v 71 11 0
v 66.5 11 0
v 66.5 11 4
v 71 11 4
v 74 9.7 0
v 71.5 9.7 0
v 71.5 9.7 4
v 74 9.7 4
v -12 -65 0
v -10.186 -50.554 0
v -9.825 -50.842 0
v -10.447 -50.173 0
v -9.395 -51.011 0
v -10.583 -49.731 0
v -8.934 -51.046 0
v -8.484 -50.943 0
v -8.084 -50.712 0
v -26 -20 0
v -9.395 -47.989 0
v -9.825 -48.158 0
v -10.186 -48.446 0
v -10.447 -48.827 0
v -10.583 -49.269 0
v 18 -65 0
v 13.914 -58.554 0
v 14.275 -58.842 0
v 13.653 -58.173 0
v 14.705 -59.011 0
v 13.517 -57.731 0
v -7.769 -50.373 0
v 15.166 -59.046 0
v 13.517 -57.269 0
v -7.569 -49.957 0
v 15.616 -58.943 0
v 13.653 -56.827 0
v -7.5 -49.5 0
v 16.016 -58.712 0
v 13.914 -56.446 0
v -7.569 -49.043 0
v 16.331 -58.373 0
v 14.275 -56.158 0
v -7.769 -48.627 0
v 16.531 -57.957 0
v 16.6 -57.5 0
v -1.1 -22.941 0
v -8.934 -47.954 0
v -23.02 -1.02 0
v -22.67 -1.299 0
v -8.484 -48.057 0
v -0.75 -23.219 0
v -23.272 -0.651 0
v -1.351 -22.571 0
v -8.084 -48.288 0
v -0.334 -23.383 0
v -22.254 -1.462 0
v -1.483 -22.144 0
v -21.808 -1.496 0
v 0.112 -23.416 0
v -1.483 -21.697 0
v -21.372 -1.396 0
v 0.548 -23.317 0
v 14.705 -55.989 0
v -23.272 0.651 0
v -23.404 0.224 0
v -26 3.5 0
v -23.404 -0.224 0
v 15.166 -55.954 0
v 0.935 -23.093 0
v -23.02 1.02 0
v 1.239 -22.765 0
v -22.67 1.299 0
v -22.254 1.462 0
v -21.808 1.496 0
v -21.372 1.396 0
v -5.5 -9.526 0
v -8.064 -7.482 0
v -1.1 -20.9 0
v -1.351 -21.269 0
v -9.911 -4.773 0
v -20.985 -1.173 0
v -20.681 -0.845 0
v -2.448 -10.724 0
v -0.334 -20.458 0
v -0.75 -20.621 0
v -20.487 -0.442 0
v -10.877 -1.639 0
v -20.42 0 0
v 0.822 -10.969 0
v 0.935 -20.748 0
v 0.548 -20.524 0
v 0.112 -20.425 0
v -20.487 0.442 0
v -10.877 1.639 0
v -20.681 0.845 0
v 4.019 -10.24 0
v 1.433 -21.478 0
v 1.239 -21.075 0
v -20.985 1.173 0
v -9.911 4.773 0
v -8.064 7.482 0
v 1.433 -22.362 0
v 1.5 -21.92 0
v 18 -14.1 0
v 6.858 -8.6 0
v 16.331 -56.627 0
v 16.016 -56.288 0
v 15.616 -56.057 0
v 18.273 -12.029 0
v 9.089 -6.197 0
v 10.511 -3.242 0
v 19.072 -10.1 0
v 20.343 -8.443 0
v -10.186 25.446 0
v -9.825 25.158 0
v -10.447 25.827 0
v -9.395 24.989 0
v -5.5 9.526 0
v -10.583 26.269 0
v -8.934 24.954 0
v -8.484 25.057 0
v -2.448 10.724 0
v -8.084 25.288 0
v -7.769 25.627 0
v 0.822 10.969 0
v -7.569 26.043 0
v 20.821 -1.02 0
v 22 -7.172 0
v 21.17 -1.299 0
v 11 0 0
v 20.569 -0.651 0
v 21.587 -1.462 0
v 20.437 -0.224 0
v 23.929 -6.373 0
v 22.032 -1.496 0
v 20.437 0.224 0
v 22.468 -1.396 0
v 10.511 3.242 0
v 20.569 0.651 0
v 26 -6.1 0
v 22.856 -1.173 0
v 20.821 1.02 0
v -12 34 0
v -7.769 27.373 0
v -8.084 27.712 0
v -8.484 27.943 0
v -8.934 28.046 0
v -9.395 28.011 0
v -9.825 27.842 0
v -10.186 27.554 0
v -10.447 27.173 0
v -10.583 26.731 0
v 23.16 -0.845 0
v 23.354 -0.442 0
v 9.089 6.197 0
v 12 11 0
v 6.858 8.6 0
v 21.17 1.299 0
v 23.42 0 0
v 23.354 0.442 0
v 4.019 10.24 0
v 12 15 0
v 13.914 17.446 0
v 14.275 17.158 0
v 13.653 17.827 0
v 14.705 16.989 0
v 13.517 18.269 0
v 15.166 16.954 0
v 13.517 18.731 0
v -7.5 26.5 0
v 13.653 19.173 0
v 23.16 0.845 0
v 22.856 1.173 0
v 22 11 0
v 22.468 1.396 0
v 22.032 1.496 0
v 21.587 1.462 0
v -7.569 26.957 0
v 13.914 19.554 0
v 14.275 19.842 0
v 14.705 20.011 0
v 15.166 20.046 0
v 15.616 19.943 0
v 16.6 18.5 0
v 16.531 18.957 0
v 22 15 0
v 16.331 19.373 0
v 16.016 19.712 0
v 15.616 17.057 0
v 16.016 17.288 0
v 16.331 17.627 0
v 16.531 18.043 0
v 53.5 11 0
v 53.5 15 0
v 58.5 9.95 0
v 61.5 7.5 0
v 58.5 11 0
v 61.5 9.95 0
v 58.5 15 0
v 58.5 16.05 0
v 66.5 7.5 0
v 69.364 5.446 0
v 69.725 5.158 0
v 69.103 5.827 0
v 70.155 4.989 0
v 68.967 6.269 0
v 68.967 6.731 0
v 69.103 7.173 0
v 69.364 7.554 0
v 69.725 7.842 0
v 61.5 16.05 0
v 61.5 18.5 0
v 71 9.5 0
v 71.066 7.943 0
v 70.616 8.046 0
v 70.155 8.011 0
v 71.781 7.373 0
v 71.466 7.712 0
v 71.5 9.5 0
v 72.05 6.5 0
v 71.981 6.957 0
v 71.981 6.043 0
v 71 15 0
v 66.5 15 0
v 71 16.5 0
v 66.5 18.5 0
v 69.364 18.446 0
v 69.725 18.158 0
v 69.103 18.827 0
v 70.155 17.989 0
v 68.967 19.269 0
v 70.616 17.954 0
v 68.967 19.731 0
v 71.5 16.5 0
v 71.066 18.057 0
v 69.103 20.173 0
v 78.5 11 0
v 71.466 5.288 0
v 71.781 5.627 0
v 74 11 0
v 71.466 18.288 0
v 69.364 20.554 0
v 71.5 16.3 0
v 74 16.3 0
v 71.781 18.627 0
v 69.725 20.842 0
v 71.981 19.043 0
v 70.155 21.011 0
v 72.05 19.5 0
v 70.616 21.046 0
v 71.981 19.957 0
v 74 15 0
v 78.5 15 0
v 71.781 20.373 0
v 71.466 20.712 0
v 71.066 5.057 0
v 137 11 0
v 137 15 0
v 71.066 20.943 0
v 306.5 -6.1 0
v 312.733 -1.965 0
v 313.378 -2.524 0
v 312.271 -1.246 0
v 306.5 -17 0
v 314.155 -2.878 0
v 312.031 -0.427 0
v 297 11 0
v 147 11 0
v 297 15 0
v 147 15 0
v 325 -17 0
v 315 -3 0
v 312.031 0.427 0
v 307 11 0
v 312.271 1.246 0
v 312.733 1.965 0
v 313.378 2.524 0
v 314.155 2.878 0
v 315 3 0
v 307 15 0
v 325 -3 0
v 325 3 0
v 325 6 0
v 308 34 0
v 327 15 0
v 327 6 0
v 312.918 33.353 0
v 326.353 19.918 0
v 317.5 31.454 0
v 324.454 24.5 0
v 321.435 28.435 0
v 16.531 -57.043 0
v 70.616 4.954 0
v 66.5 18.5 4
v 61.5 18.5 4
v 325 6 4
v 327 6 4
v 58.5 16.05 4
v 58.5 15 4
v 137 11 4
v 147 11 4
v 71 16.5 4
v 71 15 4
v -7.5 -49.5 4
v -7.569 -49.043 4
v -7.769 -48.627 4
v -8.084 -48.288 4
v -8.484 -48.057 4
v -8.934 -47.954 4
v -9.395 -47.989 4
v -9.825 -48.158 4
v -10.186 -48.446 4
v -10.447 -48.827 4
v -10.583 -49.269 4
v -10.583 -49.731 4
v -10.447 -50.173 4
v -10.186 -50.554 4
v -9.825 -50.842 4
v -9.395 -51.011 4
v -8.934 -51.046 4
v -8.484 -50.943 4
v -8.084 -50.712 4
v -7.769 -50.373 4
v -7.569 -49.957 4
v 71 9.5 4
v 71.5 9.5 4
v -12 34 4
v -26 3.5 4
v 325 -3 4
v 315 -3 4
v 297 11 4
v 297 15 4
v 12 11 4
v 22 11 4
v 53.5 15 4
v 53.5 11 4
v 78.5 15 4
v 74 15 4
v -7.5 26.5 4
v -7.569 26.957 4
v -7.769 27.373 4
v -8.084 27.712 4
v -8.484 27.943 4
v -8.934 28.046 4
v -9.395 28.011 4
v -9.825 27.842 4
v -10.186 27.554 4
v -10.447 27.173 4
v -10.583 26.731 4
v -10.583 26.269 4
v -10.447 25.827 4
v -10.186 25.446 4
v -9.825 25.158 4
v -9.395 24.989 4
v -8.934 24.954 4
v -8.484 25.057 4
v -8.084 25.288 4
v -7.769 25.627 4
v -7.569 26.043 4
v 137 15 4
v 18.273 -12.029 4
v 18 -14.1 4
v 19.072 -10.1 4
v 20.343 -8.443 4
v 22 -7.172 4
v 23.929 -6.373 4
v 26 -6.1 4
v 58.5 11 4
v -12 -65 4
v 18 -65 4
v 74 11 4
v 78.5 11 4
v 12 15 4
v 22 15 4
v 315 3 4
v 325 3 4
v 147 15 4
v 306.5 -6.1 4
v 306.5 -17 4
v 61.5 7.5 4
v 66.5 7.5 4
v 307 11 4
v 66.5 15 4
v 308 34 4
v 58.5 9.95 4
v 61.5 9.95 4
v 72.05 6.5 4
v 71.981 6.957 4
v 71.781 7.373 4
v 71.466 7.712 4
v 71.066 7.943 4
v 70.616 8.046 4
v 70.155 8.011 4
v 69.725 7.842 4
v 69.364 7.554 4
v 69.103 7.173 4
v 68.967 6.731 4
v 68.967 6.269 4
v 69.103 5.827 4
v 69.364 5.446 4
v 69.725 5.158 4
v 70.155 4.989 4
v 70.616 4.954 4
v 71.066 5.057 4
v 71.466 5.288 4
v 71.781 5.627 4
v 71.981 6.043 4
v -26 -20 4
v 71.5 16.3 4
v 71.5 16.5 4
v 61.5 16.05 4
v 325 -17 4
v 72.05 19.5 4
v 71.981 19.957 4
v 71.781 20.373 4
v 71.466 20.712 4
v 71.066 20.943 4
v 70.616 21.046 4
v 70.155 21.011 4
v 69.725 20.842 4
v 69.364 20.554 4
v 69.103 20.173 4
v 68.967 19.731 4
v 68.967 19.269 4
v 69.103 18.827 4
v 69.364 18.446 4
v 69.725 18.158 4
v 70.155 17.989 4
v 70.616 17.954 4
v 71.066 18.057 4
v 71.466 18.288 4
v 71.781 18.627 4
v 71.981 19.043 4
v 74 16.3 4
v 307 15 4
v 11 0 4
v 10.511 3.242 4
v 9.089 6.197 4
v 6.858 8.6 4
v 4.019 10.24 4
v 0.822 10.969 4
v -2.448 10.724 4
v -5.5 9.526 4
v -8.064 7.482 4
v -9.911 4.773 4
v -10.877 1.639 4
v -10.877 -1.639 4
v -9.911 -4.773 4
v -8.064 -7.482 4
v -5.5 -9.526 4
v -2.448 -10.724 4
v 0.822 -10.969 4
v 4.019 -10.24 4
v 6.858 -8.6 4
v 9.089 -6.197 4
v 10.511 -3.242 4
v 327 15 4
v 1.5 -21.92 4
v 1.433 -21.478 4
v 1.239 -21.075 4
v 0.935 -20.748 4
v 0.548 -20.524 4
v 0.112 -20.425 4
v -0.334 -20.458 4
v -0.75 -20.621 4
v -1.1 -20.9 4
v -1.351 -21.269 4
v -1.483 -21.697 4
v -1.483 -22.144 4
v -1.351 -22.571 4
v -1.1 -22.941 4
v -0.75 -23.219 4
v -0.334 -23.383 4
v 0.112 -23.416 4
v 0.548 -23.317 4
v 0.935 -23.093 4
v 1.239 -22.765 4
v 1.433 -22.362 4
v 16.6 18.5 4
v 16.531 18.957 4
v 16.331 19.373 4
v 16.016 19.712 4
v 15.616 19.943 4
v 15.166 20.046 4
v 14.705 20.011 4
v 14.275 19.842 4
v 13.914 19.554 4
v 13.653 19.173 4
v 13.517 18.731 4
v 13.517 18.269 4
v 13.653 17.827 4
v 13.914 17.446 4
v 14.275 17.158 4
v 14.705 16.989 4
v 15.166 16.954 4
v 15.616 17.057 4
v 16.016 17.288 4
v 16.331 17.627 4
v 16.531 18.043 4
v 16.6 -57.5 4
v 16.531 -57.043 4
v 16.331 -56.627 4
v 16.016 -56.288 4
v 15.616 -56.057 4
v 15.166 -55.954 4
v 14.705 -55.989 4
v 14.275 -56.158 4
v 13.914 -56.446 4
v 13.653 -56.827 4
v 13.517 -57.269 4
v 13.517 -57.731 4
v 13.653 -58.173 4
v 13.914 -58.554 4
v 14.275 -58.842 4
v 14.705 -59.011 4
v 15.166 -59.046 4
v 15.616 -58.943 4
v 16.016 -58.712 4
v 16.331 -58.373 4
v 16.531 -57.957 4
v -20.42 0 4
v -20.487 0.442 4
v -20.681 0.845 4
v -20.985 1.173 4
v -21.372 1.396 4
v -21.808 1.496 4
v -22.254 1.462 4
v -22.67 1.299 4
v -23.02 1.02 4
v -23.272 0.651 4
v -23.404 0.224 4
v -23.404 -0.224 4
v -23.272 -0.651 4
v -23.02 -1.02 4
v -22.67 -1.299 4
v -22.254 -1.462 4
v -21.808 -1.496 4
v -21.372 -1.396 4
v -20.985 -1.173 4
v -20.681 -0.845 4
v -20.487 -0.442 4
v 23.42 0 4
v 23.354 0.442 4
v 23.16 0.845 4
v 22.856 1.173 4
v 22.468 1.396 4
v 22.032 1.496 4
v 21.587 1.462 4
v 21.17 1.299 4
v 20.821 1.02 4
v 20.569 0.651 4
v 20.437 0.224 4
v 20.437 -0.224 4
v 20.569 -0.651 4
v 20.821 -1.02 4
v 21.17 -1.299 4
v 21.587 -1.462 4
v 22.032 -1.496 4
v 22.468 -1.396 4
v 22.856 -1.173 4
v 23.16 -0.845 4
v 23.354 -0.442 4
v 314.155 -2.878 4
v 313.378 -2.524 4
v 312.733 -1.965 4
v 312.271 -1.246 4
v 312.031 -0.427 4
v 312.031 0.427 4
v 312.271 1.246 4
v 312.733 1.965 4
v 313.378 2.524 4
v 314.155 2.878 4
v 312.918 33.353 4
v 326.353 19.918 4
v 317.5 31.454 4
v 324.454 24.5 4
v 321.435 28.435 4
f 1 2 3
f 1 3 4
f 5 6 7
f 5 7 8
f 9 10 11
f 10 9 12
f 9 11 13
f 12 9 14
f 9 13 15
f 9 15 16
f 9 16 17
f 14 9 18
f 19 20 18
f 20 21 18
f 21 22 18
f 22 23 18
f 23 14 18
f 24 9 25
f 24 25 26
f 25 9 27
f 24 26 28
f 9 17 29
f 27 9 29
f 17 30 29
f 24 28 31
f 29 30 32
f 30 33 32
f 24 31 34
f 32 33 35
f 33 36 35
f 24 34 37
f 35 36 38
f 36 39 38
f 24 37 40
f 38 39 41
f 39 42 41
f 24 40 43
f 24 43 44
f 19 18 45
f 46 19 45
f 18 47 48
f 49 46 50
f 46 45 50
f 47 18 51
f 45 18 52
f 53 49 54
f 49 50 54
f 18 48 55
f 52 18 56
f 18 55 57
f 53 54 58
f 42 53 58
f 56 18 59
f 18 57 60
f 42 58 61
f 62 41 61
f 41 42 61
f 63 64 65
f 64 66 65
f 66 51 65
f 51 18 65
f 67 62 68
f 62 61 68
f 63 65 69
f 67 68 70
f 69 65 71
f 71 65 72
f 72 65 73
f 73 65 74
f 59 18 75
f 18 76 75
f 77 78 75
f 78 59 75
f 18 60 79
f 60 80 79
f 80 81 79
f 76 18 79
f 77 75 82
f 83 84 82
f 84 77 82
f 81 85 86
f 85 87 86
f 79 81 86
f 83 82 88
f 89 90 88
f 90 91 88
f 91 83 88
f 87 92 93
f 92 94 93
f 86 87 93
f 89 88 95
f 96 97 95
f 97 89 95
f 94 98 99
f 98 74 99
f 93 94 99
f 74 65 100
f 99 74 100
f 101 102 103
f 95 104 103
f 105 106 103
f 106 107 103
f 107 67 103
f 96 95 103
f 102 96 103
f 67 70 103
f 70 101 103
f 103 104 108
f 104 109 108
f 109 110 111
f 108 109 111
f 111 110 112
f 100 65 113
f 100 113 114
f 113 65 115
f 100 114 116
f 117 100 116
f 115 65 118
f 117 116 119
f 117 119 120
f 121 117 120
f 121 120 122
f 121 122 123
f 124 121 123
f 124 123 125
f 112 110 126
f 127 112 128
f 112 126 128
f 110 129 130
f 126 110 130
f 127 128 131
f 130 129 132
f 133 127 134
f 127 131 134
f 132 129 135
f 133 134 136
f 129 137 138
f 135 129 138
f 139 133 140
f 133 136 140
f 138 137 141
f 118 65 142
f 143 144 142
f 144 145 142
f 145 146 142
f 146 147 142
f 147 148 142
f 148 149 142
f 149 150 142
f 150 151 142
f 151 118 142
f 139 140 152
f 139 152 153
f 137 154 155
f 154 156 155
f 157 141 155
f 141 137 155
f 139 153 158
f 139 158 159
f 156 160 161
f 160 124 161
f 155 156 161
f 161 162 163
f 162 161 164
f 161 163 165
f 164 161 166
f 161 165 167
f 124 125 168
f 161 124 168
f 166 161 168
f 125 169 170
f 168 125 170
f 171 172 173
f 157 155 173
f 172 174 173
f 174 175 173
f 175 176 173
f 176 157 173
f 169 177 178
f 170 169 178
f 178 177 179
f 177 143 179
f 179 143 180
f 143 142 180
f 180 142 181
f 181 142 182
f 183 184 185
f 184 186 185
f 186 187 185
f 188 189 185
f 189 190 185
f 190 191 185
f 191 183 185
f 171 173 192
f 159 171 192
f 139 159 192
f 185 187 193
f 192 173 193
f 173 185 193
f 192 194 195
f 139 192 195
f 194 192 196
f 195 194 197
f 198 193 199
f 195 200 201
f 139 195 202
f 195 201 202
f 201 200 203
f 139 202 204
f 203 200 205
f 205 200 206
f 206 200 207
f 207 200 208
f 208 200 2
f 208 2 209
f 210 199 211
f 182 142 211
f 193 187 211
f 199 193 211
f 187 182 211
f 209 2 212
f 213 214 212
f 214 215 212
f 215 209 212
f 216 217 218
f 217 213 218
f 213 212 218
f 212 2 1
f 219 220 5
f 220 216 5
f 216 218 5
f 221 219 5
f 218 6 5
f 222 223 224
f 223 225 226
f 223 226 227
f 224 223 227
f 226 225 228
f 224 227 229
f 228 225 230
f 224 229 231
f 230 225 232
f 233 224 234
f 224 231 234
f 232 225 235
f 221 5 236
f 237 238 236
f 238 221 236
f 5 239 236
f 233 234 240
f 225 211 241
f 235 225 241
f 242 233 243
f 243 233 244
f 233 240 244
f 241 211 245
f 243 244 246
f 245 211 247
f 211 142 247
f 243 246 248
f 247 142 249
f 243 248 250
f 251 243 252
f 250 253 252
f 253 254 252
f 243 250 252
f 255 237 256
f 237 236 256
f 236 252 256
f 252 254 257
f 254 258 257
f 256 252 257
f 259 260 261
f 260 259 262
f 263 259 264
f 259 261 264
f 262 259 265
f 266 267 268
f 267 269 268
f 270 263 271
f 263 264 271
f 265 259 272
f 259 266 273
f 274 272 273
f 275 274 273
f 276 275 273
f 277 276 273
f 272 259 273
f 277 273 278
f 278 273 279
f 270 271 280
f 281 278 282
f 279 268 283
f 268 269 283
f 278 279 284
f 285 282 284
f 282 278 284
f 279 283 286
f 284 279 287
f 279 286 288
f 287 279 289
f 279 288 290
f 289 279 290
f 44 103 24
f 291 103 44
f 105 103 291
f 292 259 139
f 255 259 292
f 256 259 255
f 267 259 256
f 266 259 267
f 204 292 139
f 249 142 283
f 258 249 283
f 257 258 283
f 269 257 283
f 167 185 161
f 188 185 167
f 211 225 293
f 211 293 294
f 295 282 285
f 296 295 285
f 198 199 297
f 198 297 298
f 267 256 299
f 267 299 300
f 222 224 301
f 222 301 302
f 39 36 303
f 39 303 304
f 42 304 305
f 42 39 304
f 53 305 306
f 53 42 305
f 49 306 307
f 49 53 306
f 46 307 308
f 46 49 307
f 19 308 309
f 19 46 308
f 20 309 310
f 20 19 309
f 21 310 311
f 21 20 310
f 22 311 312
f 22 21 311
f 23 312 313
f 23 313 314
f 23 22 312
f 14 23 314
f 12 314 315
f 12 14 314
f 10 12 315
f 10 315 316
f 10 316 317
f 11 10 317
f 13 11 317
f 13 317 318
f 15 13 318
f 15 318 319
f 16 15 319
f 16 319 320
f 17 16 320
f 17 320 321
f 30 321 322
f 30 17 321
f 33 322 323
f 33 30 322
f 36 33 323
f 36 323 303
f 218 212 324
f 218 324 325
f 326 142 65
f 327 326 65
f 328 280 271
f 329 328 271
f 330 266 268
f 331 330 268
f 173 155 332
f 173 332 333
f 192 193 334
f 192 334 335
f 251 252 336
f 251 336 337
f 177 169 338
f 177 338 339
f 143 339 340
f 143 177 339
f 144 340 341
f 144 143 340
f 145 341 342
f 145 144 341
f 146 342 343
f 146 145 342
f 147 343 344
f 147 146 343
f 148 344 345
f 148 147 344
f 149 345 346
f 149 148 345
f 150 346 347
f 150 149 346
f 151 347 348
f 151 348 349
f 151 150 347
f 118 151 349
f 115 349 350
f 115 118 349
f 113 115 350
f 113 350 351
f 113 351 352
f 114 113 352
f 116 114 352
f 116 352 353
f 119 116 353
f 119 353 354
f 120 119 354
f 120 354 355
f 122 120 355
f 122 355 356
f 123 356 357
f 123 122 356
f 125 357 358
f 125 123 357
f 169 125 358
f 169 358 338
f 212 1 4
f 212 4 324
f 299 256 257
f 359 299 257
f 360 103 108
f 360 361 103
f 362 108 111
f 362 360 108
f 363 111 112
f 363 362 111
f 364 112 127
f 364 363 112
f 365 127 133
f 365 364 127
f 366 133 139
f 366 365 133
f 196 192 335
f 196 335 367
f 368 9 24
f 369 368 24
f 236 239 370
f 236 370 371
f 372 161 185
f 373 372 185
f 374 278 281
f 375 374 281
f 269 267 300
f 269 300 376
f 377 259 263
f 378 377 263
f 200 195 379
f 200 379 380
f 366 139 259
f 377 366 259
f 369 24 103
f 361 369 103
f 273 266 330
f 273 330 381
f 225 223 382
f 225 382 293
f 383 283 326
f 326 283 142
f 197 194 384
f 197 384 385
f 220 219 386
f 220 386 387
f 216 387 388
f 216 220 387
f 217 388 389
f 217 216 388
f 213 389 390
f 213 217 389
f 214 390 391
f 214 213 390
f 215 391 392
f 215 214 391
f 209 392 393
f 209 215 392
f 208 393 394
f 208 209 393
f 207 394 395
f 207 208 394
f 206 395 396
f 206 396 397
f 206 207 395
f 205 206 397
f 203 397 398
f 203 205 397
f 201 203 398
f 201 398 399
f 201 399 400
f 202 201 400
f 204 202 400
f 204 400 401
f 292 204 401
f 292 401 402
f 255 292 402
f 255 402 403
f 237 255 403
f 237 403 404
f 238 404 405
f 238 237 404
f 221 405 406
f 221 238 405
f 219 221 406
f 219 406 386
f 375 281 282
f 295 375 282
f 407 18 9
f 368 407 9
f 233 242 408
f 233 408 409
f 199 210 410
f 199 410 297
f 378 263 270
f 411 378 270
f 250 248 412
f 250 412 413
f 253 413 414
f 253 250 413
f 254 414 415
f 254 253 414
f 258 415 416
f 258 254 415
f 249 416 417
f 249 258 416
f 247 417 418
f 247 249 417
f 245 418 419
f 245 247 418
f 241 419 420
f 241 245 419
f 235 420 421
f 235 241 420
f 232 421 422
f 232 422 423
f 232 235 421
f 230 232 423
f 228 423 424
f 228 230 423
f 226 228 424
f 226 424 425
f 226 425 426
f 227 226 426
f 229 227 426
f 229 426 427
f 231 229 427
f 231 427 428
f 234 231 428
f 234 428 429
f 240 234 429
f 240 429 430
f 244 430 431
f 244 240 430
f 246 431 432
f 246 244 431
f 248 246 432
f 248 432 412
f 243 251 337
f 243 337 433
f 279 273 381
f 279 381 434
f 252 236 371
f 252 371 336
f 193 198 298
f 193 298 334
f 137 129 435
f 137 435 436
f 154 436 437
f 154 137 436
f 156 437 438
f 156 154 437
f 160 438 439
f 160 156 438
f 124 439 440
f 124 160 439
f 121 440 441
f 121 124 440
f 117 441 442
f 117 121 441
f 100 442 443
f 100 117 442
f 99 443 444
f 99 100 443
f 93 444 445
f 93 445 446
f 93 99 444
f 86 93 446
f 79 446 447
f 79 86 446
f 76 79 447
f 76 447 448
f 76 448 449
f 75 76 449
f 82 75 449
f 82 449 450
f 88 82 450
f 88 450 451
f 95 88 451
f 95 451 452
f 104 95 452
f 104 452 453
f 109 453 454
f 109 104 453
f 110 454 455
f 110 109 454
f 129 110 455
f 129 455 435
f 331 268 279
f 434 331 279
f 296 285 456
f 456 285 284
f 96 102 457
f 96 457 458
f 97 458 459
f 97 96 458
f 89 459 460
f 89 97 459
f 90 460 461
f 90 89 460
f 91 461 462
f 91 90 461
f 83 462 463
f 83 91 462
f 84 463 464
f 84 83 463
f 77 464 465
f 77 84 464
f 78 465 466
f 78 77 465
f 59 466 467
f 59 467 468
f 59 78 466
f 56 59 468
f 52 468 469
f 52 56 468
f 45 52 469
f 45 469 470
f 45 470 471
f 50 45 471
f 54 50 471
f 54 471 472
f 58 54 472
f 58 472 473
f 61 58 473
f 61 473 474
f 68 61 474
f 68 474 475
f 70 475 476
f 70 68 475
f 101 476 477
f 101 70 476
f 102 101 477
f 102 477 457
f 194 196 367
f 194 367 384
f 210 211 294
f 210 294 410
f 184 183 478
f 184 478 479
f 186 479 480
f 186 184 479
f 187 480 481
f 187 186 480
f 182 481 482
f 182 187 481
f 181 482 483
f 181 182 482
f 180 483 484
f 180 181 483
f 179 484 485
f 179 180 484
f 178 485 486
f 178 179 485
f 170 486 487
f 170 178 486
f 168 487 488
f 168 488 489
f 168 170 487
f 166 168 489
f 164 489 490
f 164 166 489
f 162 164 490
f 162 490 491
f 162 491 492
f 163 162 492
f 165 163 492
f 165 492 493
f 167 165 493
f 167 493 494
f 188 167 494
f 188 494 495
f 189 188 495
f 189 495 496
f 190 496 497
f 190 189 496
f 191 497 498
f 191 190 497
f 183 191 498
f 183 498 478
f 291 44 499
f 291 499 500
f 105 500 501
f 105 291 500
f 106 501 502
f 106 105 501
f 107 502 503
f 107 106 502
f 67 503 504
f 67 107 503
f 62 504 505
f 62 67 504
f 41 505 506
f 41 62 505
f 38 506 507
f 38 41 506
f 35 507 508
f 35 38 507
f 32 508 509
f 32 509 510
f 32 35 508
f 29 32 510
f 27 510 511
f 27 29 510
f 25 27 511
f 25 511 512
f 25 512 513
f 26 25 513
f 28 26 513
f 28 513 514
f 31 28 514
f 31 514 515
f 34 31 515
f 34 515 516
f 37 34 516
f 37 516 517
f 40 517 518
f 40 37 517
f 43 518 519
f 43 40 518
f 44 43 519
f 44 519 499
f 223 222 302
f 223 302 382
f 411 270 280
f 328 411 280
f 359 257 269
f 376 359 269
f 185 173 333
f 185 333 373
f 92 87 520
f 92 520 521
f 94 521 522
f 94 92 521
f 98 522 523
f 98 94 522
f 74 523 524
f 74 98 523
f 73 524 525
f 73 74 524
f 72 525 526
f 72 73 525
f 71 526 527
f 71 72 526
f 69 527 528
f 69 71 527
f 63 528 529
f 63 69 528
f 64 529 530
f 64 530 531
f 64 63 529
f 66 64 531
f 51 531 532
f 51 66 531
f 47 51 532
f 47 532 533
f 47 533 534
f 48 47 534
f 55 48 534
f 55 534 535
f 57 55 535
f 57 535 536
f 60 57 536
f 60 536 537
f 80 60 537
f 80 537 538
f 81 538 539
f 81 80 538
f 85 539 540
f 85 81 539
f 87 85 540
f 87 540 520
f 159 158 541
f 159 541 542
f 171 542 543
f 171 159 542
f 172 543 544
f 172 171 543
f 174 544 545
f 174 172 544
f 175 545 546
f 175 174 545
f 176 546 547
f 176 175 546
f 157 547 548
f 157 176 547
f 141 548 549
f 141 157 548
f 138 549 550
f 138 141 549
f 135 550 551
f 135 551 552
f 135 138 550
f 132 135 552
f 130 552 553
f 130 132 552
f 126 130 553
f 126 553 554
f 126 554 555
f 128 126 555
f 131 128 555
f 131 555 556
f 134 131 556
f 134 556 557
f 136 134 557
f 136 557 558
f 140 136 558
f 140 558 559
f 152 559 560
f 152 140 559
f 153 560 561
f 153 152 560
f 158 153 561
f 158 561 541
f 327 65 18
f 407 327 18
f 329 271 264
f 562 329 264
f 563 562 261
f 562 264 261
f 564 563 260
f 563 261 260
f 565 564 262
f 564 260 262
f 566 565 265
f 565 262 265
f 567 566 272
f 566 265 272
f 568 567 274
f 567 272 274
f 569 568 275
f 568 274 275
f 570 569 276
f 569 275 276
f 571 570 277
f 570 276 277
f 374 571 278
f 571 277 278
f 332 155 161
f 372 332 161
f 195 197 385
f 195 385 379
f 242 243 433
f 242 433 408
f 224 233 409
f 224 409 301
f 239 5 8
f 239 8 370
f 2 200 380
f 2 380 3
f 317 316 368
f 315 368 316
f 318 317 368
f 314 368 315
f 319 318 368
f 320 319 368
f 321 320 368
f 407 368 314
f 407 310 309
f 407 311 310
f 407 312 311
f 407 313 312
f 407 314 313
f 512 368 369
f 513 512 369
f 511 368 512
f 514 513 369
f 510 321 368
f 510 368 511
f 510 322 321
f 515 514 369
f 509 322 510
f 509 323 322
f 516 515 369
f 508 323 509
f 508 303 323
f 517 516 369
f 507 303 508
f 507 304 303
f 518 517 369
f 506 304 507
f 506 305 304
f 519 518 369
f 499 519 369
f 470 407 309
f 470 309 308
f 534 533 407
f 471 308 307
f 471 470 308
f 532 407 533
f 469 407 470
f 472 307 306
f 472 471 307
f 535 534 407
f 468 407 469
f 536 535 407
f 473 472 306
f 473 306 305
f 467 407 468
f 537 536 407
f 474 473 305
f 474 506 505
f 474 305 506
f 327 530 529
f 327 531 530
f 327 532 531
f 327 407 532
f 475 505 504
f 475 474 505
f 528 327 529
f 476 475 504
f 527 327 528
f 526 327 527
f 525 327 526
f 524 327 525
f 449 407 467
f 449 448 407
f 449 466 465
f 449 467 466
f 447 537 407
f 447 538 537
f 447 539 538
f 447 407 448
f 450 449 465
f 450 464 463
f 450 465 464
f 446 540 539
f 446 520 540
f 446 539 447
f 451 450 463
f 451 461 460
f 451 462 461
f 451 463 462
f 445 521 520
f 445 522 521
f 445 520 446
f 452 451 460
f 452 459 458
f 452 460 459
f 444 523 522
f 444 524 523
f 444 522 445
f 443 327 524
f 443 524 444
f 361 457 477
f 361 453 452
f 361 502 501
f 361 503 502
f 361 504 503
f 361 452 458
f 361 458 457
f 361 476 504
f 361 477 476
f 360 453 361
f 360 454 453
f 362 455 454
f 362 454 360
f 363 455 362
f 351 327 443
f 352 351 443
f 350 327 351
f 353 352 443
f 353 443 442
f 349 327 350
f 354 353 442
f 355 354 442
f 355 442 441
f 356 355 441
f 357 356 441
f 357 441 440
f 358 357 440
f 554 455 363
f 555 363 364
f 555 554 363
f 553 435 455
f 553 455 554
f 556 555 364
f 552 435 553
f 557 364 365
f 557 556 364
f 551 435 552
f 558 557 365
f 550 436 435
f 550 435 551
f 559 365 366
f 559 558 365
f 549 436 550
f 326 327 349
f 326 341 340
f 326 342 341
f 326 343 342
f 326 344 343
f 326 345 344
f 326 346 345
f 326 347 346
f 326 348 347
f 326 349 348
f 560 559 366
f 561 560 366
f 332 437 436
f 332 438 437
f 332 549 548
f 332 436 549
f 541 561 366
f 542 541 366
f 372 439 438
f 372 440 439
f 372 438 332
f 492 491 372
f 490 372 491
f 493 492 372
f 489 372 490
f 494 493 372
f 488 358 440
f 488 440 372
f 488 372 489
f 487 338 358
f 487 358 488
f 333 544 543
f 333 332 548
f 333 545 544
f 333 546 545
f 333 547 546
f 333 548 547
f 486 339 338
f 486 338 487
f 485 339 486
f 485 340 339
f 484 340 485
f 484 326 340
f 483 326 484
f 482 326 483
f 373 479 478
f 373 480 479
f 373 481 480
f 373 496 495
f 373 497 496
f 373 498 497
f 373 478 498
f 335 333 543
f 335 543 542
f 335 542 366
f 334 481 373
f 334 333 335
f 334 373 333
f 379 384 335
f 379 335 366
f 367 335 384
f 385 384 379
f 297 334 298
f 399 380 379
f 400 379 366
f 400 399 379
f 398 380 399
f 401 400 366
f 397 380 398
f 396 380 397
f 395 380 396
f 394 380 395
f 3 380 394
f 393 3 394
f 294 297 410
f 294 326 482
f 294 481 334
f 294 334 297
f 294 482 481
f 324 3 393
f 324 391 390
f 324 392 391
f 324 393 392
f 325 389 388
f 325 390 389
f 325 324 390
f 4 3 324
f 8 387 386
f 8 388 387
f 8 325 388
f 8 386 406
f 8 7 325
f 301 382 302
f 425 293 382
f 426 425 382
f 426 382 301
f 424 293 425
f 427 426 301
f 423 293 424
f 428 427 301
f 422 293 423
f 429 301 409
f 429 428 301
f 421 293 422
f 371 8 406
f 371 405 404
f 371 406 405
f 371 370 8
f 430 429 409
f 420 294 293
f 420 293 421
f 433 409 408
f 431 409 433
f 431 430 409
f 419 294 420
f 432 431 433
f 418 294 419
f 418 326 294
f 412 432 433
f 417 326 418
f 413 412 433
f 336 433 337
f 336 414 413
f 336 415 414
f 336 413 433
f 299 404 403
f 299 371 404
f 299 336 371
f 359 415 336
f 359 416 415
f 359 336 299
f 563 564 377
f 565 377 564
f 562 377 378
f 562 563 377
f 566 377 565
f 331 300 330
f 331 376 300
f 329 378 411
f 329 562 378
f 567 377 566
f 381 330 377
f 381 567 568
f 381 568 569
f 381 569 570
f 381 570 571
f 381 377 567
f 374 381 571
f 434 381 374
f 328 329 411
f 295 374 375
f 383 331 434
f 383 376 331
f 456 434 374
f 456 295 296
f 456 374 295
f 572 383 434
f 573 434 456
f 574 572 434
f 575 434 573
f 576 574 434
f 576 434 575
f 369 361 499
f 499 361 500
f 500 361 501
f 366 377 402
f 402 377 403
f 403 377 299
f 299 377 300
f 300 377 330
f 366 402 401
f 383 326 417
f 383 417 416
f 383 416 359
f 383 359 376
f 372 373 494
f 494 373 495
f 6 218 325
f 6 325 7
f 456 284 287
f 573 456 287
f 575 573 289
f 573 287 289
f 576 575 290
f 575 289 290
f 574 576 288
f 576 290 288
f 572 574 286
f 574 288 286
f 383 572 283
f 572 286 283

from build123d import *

# Parameters (mm, degrees)
SKETCH1_R           = 1.5
SKETCH1_R_2         = 11
SKETCH1_R_3         = 1.55
SKETCH1_W           = 10
SKETCH1_H           = 4
BOSS_EXTRUDE1_DEPTH = 4
FILLET1_R           = 8


with BuildPart() as part:
    # Sketch1 → Boss-Extrude1 (new body)
    with BuildSketch(Plane.XY):
        with BuildLine():
            Line((-12, 34), (-26, 3.5))
            Line((-26, 3.5), (-26, -20))
            Line((-26, -20), (-12, -65))
            Line((-12, -65), (18, -65))
            Line((18, -65), (18, -45))
            Line((18, -45), (18, -6.1))
            Line((18, -6.1), (306.5, -6.1))
            Line((306.5, -6.1), (306.5, -17))
            Line((306.5, -17), (325, -17))
            Line((325, -17), (325, -3))
            Line((325, -3), (315, -3))
            ThreePointArc((315, -3), (312, 0), (315, 3))
            Line((315, 3), (325, 3))
            Line((325, 3), (325, 6))
            Line((325, 6), (327, 6))
            Line((327, 6), (327, 15))
            ThreePointArc((327, 15), (321.435028843, 28.435028843), (308, 34))
            Line((308, 34), (-12, 34))
        make_face()
        with Locations((21.920310217, 0)):
            Circle(SKETCH1_R, mode=Mode.SUBTRACT)
        with Locations((0, -21.920310217)):
            Circle(SKETCH1_R, mode=Mode.SUBTRACT)
        with Locations((-21.920310217, 0)):
            Circle(SKETCH1_R, mode=Mode.SUBTRACT)
        Circle(SKETCH1_R_2, mode=Mode.SUBTRACT)
        with Locations((-9.05, 26.5)):
            Circle(SKETCH1_R_3, mode=Mode.SUBTRACT)
        with Locations((15.05, 18.5)):
            Circle(SKETCH1_R_3, mode=Mode.SUBTRACT)
        with Locations((-9.05, -49.5)):
            Circle(SKETCH1_R_3, mode=Mode.SUBTRACT)
        with Locations((15.05, -57.5)):
            Circle(SKETCH1_R_3, mode=Mode.SUBTRACT)
        with Locations((70.5, 6.5)):
            Circle(SKETCH1_R_3, mode=Mode.SUBTRACT)
        with Locations((70.5, 19.5)):
            Circle(SKETCH1_R_3, mode=Mode.SUBTRACT)
        with Locations((17, 13)):
            Rectangle(SKETCH1_W, SKETCH1_H, mode=Mode.SUBTRACT)
        with Locations((142, 13)):
            Rectangle(SKETCH1_W, SKETCH1_H, mode=Mode.SUBTRACT)
        with Locations((302, 13)):
            Rectangle(SKETCH1_W, SKETCH1_H, mode=Mode.SUBTRACT)
        Polygon((53.5, 11), (58.5, 11), (58.5, 9.95), (61.5, 9.95), (61.5, 7.5), (66.5, 7.5), (66.5, 11), (71, 11), (71, 9.5), (71.5, 9.5), (71.5, 9.7), (74, 9.7), (74, 11), (78.5, 11), (78.5, 15), (74, 15), (74, 16.3), (71.5, 16.3), (71.5, 16.5), (71, 16.5), (71, 15), (66.5, 15), (66.5, 18.5), (61.5, 18.5), (61.5, 16.05), (58.5, 16.05), (58.5, 15), (53.5, 15), align=None, mode=Mode.SUBTRACT)
    extrude(amount=BOSS_EXTRUDE1_DEPTH)

    # Fillet1
    fillet1_edges = [part.edges().sort_by_distance(p)[0] for p in [
        (18, -6.1, 2),
    ]]
    fillet(fillet1_edges, radius=FILLET1_R)


solid = part.part
